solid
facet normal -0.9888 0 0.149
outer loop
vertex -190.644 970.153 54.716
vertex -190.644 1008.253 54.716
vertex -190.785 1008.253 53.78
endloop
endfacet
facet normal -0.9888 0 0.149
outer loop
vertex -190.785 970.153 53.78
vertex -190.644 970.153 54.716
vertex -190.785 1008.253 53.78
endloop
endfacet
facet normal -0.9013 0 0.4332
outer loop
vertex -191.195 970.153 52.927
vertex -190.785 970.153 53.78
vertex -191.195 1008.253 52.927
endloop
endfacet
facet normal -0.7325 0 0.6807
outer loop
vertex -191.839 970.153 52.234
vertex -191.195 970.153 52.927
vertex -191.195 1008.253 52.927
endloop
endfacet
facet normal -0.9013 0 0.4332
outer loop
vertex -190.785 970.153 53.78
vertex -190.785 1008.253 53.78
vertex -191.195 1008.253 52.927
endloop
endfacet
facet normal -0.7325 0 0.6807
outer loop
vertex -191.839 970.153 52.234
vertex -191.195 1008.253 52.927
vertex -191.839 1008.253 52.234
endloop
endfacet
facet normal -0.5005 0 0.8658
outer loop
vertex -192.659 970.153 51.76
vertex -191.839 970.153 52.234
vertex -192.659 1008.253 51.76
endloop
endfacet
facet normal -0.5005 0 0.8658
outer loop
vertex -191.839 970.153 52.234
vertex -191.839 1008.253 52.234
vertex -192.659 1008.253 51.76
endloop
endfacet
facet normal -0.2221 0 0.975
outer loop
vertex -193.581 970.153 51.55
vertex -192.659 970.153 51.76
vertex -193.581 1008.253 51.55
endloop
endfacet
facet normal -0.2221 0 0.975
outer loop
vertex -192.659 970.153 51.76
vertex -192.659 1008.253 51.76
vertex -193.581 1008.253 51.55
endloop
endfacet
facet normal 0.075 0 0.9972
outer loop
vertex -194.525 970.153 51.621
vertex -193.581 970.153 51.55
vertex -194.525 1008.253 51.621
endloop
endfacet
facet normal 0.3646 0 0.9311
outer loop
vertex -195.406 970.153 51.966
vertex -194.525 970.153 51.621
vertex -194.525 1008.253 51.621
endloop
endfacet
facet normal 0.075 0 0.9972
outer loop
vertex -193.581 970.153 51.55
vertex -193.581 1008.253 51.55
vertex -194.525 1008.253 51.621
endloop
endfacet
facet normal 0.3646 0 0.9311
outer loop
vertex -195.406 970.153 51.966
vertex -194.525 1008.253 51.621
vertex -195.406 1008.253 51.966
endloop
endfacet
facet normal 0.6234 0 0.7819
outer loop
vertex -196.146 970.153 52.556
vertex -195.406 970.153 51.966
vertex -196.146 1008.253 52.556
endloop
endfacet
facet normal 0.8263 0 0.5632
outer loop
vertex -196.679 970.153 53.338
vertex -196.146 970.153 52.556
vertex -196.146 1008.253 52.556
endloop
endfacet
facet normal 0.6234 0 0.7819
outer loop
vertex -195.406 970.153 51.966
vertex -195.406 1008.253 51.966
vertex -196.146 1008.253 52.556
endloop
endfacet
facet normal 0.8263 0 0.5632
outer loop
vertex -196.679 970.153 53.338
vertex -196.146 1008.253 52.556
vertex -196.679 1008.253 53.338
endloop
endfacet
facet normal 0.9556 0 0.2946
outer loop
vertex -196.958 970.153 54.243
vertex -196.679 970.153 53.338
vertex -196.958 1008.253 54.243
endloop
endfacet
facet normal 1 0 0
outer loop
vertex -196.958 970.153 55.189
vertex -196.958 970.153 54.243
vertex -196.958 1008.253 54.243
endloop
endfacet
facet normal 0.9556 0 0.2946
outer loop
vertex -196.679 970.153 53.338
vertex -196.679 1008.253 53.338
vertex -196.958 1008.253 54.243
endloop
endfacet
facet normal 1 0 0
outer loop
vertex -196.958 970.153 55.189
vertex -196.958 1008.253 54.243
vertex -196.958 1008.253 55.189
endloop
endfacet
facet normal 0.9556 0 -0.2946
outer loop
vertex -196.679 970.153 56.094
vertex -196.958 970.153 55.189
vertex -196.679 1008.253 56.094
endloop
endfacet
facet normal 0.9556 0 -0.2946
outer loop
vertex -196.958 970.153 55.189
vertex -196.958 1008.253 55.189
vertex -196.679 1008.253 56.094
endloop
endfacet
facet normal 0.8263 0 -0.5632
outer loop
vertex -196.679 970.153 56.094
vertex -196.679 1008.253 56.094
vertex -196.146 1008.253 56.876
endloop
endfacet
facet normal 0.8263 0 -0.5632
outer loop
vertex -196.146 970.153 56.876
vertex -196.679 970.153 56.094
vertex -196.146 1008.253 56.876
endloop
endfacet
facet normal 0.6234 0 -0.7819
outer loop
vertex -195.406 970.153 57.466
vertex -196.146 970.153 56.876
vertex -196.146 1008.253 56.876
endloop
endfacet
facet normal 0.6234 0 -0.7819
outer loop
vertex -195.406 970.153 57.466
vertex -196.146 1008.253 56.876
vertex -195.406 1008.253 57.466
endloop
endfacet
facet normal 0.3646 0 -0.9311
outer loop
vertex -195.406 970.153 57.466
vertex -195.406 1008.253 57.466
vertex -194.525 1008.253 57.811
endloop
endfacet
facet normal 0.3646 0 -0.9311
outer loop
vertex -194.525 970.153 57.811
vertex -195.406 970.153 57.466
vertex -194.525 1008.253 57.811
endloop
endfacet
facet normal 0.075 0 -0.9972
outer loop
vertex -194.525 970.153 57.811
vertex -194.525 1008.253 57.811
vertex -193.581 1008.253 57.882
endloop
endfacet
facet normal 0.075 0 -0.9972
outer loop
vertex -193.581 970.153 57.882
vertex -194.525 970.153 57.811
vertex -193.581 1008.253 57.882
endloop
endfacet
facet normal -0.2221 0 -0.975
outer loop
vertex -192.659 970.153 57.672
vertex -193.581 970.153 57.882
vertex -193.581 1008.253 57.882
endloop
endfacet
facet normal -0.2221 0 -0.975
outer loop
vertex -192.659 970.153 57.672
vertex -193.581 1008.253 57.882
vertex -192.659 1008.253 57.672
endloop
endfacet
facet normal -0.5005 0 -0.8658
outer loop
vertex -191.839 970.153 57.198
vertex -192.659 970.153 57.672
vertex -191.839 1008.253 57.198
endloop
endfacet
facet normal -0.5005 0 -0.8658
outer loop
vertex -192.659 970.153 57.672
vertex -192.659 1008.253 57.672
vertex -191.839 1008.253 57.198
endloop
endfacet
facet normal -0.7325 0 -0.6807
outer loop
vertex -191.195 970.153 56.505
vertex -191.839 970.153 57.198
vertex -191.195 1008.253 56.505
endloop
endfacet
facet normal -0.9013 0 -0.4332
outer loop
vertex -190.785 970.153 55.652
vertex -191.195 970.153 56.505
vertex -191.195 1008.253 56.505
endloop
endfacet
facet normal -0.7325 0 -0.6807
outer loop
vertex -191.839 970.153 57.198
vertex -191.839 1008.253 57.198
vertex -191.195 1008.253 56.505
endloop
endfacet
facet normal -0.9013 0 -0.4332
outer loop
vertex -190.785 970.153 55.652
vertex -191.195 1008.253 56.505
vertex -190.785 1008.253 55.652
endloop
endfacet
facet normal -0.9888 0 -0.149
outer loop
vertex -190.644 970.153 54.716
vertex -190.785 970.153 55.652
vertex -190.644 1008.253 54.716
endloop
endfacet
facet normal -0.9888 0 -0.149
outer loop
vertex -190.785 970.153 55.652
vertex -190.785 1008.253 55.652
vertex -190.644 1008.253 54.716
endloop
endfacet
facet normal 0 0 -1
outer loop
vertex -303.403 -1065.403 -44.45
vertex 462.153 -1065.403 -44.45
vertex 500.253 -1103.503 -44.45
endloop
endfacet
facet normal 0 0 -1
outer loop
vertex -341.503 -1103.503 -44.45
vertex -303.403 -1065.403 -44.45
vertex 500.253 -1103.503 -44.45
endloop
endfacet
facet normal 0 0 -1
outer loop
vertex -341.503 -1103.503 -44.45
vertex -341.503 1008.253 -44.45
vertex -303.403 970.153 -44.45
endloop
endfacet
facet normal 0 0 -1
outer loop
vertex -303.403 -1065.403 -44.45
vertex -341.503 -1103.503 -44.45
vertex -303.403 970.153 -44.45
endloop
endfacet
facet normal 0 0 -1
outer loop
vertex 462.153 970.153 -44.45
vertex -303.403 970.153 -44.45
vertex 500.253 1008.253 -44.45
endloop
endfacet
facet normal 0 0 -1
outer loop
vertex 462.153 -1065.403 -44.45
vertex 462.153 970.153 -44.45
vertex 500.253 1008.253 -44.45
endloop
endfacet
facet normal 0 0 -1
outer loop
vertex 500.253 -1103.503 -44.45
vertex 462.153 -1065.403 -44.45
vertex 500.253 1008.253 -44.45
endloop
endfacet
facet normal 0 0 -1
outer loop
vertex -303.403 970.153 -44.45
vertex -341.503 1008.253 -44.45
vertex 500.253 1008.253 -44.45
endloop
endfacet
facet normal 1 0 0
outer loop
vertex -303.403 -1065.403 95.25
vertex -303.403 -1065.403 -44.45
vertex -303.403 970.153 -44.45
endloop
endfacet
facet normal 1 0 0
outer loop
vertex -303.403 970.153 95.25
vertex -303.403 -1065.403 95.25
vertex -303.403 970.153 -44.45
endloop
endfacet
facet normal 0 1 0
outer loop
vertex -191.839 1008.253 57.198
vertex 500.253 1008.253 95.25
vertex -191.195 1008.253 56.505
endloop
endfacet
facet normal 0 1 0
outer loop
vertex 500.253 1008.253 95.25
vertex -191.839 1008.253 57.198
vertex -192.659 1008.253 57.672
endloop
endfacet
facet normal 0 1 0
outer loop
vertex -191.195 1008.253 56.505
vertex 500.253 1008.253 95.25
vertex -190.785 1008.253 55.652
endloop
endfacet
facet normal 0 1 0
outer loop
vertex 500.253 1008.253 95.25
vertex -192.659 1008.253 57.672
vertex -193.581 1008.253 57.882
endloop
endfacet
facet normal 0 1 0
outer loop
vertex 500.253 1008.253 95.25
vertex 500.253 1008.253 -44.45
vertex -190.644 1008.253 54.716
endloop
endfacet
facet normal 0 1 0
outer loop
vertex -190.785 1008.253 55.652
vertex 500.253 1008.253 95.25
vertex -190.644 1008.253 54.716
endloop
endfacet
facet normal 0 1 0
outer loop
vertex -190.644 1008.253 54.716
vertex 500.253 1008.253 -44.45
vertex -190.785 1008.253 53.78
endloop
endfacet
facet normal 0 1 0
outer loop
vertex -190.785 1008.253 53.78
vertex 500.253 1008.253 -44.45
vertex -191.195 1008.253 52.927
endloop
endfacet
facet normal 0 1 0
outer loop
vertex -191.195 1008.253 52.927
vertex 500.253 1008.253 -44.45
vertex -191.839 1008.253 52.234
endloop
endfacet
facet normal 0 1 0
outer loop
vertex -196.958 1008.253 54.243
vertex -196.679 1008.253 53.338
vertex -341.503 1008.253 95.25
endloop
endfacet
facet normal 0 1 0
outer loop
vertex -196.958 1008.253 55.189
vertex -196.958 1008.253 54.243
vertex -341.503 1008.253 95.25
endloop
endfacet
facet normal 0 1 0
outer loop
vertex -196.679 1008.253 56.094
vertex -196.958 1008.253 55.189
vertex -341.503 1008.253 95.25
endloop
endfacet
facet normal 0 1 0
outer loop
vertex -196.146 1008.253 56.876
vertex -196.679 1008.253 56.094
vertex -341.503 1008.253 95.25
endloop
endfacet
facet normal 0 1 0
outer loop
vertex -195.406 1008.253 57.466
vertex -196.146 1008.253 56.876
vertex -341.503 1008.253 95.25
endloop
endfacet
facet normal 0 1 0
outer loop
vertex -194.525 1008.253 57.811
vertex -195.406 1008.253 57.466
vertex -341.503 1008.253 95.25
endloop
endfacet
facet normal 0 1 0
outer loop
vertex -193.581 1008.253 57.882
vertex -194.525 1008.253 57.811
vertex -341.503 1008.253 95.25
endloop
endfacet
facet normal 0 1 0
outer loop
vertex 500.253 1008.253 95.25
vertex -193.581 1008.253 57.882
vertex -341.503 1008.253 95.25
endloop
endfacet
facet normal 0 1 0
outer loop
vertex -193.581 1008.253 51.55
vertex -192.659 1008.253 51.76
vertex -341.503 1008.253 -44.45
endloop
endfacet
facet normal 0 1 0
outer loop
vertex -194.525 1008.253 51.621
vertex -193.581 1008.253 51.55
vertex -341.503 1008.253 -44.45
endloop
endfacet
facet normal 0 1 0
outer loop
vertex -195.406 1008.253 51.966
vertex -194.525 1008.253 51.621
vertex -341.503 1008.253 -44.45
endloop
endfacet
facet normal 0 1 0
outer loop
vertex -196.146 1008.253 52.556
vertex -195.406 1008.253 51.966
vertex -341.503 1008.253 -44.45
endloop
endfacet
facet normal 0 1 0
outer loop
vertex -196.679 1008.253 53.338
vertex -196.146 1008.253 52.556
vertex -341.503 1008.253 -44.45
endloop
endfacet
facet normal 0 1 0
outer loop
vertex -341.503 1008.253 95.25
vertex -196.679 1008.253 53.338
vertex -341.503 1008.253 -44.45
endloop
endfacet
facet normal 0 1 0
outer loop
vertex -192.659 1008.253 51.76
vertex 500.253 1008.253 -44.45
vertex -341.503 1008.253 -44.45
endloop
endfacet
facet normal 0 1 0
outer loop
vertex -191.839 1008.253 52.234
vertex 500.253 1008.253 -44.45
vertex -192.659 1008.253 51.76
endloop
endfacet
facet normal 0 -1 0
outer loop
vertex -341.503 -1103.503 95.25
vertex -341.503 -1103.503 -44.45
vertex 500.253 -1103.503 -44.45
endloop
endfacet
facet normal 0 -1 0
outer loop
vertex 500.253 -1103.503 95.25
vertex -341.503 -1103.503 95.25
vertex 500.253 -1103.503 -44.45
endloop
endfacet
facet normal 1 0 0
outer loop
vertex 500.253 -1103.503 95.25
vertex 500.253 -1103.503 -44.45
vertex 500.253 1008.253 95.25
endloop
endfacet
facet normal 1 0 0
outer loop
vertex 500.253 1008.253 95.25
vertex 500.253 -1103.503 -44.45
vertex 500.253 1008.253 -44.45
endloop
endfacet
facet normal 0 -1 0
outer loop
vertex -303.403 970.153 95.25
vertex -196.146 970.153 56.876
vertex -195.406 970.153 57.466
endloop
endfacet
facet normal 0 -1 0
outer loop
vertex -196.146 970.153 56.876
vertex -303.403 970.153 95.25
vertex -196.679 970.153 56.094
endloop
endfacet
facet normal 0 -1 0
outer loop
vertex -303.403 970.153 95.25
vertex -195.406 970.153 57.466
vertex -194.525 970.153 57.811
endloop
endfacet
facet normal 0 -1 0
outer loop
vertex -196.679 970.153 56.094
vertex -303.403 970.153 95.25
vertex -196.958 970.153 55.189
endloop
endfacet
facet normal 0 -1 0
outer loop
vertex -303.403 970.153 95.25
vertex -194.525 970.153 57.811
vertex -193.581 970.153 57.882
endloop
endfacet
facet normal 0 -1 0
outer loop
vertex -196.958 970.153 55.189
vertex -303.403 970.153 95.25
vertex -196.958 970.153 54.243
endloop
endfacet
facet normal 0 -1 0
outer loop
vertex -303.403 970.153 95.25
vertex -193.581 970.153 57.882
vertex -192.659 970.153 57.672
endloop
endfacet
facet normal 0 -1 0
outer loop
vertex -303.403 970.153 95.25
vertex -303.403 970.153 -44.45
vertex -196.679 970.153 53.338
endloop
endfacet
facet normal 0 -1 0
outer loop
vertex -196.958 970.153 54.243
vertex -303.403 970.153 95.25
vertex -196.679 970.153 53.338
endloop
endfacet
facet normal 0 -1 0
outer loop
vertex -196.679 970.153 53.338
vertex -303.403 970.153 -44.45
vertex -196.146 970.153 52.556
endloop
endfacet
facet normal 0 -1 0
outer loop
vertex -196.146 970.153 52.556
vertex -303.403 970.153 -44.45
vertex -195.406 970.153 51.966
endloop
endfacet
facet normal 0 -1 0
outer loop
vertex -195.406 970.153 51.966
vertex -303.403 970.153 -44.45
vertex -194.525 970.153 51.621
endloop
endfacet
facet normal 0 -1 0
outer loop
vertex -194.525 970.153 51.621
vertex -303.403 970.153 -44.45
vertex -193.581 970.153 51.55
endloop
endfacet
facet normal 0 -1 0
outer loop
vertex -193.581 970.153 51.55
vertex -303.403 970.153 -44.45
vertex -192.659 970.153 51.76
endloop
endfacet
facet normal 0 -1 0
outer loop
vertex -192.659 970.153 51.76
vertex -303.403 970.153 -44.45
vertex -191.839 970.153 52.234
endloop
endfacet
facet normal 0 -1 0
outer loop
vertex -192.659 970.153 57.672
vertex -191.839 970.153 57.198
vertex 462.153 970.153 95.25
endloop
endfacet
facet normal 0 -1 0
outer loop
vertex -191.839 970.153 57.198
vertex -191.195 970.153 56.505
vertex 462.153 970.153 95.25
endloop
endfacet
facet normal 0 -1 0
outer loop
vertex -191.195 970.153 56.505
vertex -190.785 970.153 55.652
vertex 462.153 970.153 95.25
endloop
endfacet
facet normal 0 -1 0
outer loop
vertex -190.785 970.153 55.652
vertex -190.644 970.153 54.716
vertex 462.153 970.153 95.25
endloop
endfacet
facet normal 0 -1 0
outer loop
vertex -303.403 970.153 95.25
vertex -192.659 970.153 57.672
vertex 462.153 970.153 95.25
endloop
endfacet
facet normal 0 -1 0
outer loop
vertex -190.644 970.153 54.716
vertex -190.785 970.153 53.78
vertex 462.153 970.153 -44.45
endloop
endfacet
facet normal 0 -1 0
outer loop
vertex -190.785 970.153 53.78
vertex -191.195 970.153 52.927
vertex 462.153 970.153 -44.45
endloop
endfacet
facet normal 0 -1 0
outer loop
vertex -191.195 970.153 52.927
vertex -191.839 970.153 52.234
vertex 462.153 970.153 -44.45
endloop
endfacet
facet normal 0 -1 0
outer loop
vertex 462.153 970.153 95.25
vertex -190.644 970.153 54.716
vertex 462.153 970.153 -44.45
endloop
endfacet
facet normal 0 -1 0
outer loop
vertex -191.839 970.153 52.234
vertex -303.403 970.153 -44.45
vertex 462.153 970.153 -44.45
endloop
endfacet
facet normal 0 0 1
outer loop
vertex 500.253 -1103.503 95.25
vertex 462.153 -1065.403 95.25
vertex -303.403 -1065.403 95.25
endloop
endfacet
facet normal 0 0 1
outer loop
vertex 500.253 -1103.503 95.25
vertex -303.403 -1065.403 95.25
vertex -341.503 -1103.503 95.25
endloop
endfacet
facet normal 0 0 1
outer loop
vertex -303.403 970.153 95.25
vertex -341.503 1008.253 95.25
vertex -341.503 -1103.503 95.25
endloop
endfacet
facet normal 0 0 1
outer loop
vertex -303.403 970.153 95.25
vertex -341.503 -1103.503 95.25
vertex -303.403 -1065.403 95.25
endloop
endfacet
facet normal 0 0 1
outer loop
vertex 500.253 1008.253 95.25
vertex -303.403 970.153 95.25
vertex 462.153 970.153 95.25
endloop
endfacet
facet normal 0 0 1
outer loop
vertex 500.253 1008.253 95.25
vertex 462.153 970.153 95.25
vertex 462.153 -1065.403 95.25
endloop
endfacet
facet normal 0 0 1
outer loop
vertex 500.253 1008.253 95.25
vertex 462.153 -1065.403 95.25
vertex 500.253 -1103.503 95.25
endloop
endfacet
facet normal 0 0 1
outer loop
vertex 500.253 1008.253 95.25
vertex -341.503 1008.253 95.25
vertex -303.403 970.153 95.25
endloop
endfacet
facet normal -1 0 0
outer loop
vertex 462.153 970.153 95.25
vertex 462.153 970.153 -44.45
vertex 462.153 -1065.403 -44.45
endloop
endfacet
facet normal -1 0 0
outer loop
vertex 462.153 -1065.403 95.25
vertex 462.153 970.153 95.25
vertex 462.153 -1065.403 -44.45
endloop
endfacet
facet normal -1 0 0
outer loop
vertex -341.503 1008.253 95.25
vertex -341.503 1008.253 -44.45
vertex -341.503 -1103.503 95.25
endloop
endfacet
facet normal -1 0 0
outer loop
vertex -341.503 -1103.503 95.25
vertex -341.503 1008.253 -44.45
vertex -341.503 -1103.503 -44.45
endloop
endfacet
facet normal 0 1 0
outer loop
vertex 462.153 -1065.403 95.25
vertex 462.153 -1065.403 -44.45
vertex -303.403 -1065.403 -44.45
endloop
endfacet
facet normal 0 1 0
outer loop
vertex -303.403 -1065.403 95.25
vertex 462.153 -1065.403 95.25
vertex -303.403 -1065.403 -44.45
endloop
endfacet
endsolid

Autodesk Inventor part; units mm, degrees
ref_plane "YZ Plane" through (0, 0, 0) normal (1, 0, 0) x (0, 1, 0)
ref_plane "XZ Plane" through (0, 0, 0) normal (0, 1, 0) x (-1, 0, 0)
ref_plane "XY Plane" through (0, 0, 0) normal (0, 0, 1) x (1, 0, 0)
ref_plane "Work Plane1" through (0, 0, 0) normal (0, 0, 1) x (1, 0, 0)
sketch "Sketch1" plane through (0, 0, 0) normal (0, 0, 1) x (1, 0, 0)
  line L0 (-295.275, -1057.275) -> (454.025, -1057.275) projected
  line L1 (454.025, -1057.275) -> (454.025, 962.025) projected
  circle A0 centre (384.175, -28.575) radius 31.4325 projected
  line L2 (454.025, 962.025) -> (-295.275, 962.025) projected
  line L3 (-295.275, 962.025) -> (-295.275, -1057.275) projected
  line L4 (462.153, 970.153) -> (462.153, -1065.403)
  line L5 (462.153, -1065.403) -> (-303.403, -1065.403)
  line L6 (-303.403, -1065.403) -> (-303.403, 970.153)
  line L7 (-303.403, 970.153) -> (462.153, 970.153)
  line L8 (500.253, -1103.503) -> (500.253, 1008.253)
  line L9 (500.253, 1008.253) -> (-341.503, 1008.253)
  line L10 (-341.503, 1008.253) -> (-341.503, -1103.503)
  line L11 (-341.503, -1103.503) -> (500.253, -1103.503)
  point P0 (-454.025, -1057.275)
  point P1 (454.025, 1057.275)
  point P2 (-454.025, 1057.275)
  point P3 (-454.025, 933.45)
  point P4 (-454.025, 819.15)
  point P5 (-454.025, 114.3)
  point P6 (-454.025, 0)
  point P7 (-454.025, -704.85)
  point P8 (-454.025, -819.15)
  dimension "d17" = 8.128
  dimension "d18" = 38.1
extrude "Extrusion1" add sketch "Sketch1" along normal blind 95.25 and the other way blind 44.45 contours L11 L10 L9 L8
sketch "Sketch2" plane through (-341.503, 1008.253, 95.25) normal (0, 1, 0) x (1, 0, 0)
  circle A0 centre (147.6845, 40.534) radius 3.175
  point P0 (341.503, 95.25)
  dimension "d19" = 6.35
extrude "Extrusion2" cut sketch "Sketch2" against normal blind 95.25
properties part number "DoorFrame"
